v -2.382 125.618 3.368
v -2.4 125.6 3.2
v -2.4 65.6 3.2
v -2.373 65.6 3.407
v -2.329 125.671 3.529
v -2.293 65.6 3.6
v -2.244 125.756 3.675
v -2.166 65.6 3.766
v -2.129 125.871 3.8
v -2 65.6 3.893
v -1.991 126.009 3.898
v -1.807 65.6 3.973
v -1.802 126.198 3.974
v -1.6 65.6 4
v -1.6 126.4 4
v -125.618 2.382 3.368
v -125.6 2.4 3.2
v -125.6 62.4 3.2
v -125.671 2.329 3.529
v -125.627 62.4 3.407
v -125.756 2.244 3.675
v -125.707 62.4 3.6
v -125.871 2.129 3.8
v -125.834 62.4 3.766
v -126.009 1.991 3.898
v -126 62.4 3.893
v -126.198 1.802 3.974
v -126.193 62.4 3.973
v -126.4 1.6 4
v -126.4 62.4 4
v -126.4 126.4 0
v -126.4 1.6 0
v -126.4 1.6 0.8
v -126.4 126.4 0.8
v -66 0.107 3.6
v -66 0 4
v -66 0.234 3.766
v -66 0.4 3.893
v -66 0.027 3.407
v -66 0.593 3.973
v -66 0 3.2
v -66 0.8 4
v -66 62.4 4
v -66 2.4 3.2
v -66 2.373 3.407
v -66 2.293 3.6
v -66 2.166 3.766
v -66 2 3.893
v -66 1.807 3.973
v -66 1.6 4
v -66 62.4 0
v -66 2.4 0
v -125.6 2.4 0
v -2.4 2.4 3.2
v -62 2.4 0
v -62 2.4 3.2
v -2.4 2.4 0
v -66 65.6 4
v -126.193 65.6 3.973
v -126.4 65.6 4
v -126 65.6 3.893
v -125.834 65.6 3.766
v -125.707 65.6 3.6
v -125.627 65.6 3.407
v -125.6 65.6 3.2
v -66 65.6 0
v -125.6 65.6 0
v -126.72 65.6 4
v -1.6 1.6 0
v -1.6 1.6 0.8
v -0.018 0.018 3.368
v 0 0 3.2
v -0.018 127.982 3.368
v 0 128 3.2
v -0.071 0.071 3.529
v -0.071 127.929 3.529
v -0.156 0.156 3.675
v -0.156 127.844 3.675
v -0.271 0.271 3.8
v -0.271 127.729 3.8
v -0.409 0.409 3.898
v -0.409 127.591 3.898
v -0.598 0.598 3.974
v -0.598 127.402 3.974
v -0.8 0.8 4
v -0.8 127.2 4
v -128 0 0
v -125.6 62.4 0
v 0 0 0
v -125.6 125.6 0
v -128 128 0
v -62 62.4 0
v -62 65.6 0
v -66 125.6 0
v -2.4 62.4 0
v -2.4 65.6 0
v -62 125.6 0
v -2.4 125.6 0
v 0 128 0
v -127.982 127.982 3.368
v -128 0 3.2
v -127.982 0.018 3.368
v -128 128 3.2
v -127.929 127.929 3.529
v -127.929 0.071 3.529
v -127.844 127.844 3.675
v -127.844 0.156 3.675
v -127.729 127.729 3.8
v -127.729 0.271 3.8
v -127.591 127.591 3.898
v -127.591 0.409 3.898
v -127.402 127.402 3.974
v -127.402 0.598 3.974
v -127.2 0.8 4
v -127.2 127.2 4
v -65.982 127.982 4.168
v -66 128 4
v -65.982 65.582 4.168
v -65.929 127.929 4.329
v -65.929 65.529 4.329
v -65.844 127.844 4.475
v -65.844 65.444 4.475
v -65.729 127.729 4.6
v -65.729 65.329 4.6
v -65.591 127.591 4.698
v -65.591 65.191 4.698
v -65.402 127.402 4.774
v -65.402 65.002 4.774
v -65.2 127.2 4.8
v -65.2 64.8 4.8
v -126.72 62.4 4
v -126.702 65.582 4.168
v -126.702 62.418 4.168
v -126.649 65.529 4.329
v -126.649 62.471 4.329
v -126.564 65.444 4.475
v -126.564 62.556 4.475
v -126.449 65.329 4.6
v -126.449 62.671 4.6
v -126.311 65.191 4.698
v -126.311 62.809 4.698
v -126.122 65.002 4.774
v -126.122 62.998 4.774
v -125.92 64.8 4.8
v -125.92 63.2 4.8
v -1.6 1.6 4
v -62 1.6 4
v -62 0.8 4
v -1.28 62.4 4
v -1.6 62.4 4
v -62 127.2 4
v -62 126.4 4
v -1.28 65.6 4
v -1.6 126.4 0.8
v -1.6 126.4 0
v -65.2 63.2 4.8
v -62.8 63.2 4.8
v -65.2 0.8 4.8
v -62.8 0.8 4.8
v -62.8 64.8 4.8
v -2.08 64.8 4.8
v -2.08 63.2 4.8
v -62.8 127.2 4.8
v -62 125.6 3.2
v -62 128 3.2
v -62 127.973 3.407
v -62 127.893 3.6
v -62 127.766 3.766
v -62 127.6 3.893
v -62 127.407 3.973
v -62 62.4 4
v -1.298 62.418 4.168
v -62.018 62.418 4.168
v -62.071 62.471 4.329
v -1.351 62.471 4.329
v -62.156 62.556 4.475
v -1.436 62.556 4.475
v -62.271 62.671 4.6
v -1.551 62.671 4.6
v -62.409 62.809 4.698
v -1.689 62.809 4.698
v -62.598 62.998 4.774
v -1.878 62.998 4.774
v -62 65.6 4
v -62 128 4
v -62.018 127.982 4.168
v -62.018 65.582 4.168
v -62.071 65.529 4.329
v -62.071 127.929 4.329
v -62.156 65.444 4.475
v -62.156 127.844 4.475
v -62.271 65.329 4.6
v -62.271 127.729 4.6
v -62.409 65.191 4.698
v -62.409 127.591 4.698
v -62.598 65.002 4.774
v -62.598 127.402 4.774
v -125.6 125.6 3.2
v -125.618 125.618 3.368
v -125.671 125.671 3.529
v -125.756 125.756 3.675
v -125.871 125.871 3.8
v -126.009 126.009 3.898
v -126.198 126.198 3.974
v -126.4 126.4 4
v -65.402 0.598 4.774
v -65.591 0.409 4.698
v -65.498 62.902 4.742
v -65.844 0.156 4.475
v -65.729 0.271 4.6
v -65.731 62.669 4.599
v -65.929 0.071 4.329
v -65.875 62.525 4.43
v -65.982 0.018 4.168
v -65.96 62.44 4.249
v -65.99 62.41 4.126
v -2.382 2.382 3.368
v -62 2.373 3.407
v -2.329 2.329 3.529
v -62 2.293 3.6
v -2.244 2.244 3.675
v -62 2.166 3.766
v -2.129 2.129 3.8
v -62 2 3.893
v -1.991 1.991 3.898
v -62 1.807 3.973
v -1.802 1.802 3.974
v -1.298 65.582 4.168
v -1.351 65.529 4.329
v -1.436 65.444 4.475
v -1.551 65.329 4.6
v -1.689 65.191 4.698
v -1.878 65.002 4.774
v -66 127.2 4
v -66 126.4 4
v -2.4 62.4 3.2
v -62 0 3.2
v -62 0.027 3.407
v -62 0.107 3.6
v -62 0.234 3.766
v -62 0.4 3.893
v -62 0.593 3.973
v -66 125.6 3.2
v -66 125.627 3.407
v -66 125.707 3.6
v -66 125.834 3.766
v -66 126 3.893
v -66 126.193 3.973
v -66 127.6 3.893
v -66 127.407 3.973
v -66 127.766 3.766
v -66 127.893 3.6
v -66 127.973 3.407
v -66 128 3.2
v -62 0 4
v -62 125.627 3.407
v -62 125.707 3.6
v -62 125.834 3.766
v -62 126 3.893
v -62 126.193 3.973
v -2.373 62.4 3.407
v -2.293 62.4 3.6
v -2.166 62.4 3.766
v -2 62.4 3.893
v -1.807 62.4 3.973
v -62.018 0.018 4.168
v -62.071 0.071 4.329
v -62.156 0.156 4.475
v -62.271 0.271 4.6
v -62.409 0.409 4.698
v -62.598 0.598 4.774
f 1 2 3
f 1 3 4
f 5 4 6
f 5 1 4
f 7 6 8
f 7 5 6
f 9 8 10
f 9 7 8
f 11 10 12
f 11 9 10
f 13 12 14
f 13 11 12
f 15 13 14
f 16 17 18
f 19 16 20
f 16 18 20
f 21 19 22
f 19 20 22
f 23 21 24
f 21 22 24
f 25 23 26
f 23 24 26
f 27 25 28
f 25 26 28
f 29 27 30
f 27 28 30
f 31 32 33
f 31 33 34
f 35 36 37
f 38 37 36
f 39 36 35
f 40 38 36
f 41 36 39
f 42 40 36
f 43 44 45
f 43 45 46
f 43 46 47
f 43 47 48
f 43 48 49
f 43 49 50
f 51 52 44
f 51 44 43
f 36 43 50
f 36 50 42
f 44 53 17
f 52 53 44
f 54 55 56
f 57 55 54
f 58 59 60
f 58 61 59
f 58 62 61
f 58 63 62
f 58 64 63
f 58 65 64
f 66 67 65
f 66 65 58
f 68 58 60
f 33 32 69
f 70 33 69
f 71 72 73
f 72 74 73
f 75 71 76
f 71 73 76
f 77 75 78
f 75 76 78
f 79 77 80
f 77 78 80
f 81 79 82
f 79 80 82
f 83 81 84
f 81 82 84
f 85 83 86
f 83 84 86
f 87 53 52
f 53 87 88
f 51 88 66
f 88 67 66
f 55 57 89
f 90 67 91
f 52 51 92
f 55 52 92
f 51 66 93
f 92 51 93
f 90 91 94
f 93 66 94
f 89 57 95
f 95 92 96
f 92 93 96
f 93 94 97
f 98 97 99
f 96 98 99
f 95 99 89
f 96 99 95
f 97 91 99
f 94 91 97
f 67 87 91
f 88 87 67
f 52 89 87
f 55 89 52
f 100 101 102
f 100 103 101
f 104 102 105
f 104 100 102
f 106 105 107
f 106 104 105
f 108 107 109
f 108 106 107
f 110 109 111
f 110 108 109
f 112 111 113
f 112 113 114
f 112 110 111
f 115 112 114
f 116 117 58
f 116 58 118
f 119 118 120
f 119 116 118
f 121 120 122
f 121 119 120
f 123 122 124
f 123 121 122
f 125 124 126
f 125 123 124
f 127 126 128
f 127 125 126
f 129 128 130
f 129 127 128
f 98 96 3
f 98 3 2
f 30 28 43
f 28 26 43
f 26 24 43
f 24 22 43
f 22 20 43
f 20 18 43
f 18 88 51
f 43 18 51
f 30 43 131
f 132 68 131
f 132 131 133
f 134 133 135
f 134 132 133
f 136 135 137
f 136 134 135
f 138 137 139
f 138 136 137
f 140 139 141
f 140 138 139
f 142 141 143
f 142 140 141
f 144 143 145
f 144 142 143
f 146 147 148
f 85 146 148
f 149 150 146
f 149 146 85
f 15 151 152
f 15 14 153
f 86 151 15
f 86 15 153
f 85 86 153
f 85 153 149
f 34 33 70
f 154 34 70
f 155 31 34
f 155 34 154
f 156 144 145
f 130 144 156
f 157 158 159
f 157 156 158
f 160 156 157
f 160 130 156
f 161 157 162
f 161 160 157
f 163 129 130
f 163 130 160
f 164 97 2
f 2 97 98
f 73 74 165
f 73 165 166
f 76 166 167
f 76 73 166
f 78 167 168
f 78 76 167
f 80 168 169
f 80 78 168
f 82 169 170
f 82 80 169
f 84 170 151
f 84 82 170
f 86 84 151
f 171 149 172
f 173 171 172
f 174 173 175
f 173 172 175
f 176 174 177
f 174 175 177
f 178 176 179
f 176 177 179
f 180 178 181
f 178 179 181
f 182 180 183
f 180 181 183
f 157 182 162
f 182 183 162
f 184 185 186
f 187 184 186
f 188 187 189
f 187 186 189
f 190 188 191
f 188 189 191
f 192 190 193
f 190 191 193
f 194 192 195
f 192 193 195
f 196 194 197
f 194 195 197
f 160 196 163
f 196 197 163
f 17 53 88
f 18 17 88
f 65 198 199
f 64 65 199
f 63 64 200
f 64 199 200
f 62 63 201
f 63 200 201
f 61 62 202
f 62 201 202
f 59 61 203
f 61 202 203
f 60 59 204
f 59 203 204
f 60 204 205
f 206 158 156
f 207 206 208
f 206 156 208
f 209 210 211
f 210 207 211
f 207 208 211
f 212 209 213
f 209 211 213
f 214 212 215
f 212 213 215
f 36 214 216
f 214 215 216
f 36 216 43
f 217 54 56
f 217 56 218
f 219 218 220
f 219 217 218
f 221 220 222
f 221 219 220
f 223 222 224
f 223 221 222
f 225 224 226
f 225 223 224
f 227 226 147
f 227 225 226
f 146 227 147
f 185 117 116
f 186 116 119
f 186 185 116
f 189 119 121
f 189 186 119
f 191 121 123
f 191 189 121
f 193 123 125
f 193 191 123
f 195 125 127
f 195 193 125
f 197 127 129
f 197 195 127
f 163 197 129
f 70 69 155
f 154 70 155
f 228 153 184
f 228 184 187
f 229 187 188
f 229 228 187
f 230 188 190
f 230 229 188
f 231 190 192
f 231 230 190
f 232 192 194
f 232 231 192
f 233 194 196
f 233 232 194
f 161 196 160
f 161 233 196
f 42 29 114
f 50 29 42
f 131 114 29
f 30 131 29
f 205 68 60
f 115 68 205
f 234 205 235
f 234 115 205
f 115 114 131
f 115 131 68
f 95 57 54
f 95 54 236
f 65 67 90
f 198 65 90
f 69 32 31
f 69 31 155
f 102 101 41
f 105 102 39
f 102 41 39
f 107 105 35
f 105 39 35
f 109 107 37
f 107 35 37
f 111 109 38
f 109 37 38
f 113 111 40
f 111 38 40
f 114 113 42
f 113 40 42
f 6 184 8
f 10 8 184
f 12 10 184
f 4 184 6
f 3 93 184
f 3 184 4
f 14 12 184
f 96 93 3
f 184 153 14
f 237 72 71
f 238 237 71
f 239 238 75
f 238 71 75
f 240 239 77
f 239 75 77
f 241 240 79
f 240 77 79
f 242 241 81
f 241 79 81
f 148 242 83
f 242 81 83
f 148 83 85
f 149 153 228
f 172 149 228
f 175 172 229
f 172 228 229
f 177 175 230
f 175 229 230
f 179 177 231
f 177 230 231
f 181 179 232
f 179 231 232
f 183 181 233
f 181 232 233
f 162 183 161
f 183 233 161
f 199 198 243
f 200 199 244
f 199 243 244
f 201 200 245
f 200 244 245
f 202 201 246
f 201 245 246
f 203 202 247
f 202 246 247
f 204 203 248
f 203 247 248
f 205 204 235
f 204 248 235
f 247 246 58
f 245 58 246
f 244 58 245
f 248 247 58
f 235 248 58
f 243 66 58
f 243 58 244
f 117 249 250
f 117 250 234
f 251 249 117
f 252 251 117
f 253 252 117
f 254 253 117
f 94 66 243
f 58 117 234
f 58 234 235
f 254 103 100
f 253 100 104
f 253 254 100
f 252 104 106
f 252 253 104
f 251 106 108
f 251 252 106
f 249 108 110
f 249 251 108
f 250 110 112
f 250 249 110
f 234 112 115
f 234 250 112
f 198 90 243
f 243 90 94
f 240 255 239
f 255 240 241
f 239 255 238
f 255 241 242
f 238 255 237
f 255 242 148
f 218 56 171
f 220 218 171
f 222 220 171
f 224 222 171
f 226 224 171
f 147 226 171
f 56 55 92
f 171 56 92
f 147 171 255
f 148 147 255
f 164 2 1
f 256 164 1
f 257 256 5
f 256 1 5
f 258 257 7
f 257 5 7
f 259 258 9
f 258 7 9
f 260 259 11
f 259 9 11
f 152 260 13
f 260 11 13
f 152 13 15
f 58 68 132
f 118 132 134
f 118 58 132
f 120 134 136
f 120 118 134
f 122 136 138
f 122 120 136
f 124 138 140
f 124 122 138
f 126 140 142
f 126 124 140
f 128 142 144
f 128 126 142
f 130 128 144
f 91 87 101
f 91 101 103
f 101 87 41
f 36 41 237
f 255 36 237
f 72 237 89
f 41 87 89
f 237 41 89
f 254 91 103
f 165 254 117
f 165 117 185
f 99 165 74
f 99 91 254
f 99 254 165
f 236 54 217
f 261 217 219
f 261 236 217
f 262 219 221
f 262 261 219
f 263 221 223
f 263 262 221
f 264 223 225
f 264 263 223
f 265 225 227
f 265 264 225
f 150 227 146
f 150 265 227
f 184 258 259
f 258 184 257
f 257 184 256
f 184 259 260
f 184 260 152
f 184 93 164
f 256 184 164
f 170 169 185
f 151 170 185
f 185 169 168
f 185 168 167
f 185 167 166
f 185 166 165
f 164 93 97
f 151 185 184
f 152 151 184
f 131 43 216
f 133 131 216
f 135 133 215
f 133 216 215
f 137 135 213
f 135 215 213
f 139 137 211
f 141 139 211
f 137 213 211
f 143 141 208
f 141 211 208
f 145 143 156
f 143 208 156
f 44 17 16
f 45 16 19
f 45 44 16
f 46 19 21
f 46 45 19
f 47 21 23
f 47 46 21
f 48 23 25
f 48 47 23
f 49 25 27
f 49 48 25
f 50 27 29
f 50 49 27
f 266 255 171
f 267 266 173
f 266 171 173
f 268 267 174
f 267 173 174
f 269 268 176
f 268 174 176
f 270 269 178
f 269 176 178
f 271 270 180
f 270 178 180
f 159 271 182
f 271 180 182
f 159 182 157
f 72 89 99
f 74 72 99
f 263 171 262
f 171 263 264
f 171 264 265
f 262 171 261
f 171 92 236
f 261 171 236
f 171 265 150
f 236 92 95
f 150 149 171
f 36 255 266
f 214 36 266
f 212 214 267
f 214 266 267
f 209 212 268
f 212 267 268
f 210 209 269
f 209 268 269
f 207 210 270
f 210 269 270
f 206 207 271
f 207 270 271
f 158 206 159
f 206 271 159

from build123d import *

# Parameters (mm, degrees)
SKETCH1_W           = 1600
SKETCH1_H           = 1600
SKETCH1_W_2         = 1540
SKETCH1_H_2         = 1540
BOSS_EXTRUDE1_DEPTH = 50
FILLET1_R           = 10
SKETCH2_W           = 50
SKETCH2_H           = 1600
SKETCH2_W_2         = 1568
SKETCH2_H_2         = 40
BOSS_EXTRUDE2_DEPTH = 60
FILLET2_R           = 10
SKETCH4_W           = 1560
SKETCH4_H           = 1560
BOSS_EXTRUDE3_DEPTH = 10
SCALE1_SCALE        = 0.25
SCALE2_SCALE        = 0.32


with BuildPart() as part:
    # Sketch1 → Boss-Extrude1 (new body)
    with BuildSketch(Plane.XY):
        with Locations((-800, 800)):
            Rectangle(SKETCH1_W, SKETCH1_H)
        with Locations((-800, 800)):
            Rectangle(SKETCH1_W_2, SKETCH1_H_2, mode=Mode.SUBTRACT)
    extrude(amount=BOSS_EXTRUDE1_DEPTH)

    # Fillet1
    fillet1_edges = [part.edges().sort_by_distance(p)[0] for p in [
        (-1600, 800, 50),
        (-800, 0, 50),
        (-800, 30, 50),
        (-30, 800, 50),
        (-800, 1570, 50),
        (-1570, 800, 50),
        (0, 800, 50),
        (-800, 1600, 50),
    ]]
    fillet(fillet1_edges, radius=FILLET1_R)

    # Sketch2 → Boss-Extrude2 (add)
    with BuildSketch(Plane.XY):
        with Locations((-800, 800)):
            Rectangle(SKETCH2_W, SKETCH2_H)
        with Locations((-800, 800)):
            Rectangle(SKETCH2_W_2, SKETCH2_H_2)
    extrude(amount=BOSS_EXTRUDE2_DEPTH)

    # Fillet2
    fillet2_edges = [part.edges().sort_by_distance(p)[0] for p in [
        (-800, 0, 60),
        (-825, 390, 60),
        (-1204.5, 780, 60),
        (-1584, 800, 60),
        (-1204.5, 820, 60),
        (-825, 1210, 60),
        (-800, 1600, 60),
        (-775, 1210, 60),
        (-395.5, 820, 60),
        (-16, 800, 60),
        (-395.5, 780, 60),
        (-775, 390, 60),
    ]]
    fillet(fillet2_edges, radius=FILLET2_R - 0.0001)  # a hair under: the kernel refuses the full size


with BuildPart() as body_2:
    # Sketch4 → Boss-Extrude3 (new body)
    with BuildSketch(Plane.XY):
        with Locations((-800, 800)):
            Rectangle(SKETCH4_W, SKETCH4_H)
    extrude(amount=BOSS_EXTRUDE3_DEPTH)


with BuildPart() as body_2_1:
    # Scale1: scaled about (0, 0, 0)
    add(body_2.part.scale(SCALE1_SCALE))


with BuildPart() as part_1:
    # Scale1: scaled about (0, 0, 0)
    add(part.part.scale(SCALE1_SCALE))


with BuildPart() as part_2:
    # Scale2: scaled about (0, 0, 0)
    add(part_1.part.scale(SCALE2_SCALE))


with BuildPart() as body_2_2:
    # Scale2: scaled about (0, 0, 0)
    add(body_2_1.part.scale(SCALE2_SCALE))


solid = Compound([part_2.part, body_2_2.part])
